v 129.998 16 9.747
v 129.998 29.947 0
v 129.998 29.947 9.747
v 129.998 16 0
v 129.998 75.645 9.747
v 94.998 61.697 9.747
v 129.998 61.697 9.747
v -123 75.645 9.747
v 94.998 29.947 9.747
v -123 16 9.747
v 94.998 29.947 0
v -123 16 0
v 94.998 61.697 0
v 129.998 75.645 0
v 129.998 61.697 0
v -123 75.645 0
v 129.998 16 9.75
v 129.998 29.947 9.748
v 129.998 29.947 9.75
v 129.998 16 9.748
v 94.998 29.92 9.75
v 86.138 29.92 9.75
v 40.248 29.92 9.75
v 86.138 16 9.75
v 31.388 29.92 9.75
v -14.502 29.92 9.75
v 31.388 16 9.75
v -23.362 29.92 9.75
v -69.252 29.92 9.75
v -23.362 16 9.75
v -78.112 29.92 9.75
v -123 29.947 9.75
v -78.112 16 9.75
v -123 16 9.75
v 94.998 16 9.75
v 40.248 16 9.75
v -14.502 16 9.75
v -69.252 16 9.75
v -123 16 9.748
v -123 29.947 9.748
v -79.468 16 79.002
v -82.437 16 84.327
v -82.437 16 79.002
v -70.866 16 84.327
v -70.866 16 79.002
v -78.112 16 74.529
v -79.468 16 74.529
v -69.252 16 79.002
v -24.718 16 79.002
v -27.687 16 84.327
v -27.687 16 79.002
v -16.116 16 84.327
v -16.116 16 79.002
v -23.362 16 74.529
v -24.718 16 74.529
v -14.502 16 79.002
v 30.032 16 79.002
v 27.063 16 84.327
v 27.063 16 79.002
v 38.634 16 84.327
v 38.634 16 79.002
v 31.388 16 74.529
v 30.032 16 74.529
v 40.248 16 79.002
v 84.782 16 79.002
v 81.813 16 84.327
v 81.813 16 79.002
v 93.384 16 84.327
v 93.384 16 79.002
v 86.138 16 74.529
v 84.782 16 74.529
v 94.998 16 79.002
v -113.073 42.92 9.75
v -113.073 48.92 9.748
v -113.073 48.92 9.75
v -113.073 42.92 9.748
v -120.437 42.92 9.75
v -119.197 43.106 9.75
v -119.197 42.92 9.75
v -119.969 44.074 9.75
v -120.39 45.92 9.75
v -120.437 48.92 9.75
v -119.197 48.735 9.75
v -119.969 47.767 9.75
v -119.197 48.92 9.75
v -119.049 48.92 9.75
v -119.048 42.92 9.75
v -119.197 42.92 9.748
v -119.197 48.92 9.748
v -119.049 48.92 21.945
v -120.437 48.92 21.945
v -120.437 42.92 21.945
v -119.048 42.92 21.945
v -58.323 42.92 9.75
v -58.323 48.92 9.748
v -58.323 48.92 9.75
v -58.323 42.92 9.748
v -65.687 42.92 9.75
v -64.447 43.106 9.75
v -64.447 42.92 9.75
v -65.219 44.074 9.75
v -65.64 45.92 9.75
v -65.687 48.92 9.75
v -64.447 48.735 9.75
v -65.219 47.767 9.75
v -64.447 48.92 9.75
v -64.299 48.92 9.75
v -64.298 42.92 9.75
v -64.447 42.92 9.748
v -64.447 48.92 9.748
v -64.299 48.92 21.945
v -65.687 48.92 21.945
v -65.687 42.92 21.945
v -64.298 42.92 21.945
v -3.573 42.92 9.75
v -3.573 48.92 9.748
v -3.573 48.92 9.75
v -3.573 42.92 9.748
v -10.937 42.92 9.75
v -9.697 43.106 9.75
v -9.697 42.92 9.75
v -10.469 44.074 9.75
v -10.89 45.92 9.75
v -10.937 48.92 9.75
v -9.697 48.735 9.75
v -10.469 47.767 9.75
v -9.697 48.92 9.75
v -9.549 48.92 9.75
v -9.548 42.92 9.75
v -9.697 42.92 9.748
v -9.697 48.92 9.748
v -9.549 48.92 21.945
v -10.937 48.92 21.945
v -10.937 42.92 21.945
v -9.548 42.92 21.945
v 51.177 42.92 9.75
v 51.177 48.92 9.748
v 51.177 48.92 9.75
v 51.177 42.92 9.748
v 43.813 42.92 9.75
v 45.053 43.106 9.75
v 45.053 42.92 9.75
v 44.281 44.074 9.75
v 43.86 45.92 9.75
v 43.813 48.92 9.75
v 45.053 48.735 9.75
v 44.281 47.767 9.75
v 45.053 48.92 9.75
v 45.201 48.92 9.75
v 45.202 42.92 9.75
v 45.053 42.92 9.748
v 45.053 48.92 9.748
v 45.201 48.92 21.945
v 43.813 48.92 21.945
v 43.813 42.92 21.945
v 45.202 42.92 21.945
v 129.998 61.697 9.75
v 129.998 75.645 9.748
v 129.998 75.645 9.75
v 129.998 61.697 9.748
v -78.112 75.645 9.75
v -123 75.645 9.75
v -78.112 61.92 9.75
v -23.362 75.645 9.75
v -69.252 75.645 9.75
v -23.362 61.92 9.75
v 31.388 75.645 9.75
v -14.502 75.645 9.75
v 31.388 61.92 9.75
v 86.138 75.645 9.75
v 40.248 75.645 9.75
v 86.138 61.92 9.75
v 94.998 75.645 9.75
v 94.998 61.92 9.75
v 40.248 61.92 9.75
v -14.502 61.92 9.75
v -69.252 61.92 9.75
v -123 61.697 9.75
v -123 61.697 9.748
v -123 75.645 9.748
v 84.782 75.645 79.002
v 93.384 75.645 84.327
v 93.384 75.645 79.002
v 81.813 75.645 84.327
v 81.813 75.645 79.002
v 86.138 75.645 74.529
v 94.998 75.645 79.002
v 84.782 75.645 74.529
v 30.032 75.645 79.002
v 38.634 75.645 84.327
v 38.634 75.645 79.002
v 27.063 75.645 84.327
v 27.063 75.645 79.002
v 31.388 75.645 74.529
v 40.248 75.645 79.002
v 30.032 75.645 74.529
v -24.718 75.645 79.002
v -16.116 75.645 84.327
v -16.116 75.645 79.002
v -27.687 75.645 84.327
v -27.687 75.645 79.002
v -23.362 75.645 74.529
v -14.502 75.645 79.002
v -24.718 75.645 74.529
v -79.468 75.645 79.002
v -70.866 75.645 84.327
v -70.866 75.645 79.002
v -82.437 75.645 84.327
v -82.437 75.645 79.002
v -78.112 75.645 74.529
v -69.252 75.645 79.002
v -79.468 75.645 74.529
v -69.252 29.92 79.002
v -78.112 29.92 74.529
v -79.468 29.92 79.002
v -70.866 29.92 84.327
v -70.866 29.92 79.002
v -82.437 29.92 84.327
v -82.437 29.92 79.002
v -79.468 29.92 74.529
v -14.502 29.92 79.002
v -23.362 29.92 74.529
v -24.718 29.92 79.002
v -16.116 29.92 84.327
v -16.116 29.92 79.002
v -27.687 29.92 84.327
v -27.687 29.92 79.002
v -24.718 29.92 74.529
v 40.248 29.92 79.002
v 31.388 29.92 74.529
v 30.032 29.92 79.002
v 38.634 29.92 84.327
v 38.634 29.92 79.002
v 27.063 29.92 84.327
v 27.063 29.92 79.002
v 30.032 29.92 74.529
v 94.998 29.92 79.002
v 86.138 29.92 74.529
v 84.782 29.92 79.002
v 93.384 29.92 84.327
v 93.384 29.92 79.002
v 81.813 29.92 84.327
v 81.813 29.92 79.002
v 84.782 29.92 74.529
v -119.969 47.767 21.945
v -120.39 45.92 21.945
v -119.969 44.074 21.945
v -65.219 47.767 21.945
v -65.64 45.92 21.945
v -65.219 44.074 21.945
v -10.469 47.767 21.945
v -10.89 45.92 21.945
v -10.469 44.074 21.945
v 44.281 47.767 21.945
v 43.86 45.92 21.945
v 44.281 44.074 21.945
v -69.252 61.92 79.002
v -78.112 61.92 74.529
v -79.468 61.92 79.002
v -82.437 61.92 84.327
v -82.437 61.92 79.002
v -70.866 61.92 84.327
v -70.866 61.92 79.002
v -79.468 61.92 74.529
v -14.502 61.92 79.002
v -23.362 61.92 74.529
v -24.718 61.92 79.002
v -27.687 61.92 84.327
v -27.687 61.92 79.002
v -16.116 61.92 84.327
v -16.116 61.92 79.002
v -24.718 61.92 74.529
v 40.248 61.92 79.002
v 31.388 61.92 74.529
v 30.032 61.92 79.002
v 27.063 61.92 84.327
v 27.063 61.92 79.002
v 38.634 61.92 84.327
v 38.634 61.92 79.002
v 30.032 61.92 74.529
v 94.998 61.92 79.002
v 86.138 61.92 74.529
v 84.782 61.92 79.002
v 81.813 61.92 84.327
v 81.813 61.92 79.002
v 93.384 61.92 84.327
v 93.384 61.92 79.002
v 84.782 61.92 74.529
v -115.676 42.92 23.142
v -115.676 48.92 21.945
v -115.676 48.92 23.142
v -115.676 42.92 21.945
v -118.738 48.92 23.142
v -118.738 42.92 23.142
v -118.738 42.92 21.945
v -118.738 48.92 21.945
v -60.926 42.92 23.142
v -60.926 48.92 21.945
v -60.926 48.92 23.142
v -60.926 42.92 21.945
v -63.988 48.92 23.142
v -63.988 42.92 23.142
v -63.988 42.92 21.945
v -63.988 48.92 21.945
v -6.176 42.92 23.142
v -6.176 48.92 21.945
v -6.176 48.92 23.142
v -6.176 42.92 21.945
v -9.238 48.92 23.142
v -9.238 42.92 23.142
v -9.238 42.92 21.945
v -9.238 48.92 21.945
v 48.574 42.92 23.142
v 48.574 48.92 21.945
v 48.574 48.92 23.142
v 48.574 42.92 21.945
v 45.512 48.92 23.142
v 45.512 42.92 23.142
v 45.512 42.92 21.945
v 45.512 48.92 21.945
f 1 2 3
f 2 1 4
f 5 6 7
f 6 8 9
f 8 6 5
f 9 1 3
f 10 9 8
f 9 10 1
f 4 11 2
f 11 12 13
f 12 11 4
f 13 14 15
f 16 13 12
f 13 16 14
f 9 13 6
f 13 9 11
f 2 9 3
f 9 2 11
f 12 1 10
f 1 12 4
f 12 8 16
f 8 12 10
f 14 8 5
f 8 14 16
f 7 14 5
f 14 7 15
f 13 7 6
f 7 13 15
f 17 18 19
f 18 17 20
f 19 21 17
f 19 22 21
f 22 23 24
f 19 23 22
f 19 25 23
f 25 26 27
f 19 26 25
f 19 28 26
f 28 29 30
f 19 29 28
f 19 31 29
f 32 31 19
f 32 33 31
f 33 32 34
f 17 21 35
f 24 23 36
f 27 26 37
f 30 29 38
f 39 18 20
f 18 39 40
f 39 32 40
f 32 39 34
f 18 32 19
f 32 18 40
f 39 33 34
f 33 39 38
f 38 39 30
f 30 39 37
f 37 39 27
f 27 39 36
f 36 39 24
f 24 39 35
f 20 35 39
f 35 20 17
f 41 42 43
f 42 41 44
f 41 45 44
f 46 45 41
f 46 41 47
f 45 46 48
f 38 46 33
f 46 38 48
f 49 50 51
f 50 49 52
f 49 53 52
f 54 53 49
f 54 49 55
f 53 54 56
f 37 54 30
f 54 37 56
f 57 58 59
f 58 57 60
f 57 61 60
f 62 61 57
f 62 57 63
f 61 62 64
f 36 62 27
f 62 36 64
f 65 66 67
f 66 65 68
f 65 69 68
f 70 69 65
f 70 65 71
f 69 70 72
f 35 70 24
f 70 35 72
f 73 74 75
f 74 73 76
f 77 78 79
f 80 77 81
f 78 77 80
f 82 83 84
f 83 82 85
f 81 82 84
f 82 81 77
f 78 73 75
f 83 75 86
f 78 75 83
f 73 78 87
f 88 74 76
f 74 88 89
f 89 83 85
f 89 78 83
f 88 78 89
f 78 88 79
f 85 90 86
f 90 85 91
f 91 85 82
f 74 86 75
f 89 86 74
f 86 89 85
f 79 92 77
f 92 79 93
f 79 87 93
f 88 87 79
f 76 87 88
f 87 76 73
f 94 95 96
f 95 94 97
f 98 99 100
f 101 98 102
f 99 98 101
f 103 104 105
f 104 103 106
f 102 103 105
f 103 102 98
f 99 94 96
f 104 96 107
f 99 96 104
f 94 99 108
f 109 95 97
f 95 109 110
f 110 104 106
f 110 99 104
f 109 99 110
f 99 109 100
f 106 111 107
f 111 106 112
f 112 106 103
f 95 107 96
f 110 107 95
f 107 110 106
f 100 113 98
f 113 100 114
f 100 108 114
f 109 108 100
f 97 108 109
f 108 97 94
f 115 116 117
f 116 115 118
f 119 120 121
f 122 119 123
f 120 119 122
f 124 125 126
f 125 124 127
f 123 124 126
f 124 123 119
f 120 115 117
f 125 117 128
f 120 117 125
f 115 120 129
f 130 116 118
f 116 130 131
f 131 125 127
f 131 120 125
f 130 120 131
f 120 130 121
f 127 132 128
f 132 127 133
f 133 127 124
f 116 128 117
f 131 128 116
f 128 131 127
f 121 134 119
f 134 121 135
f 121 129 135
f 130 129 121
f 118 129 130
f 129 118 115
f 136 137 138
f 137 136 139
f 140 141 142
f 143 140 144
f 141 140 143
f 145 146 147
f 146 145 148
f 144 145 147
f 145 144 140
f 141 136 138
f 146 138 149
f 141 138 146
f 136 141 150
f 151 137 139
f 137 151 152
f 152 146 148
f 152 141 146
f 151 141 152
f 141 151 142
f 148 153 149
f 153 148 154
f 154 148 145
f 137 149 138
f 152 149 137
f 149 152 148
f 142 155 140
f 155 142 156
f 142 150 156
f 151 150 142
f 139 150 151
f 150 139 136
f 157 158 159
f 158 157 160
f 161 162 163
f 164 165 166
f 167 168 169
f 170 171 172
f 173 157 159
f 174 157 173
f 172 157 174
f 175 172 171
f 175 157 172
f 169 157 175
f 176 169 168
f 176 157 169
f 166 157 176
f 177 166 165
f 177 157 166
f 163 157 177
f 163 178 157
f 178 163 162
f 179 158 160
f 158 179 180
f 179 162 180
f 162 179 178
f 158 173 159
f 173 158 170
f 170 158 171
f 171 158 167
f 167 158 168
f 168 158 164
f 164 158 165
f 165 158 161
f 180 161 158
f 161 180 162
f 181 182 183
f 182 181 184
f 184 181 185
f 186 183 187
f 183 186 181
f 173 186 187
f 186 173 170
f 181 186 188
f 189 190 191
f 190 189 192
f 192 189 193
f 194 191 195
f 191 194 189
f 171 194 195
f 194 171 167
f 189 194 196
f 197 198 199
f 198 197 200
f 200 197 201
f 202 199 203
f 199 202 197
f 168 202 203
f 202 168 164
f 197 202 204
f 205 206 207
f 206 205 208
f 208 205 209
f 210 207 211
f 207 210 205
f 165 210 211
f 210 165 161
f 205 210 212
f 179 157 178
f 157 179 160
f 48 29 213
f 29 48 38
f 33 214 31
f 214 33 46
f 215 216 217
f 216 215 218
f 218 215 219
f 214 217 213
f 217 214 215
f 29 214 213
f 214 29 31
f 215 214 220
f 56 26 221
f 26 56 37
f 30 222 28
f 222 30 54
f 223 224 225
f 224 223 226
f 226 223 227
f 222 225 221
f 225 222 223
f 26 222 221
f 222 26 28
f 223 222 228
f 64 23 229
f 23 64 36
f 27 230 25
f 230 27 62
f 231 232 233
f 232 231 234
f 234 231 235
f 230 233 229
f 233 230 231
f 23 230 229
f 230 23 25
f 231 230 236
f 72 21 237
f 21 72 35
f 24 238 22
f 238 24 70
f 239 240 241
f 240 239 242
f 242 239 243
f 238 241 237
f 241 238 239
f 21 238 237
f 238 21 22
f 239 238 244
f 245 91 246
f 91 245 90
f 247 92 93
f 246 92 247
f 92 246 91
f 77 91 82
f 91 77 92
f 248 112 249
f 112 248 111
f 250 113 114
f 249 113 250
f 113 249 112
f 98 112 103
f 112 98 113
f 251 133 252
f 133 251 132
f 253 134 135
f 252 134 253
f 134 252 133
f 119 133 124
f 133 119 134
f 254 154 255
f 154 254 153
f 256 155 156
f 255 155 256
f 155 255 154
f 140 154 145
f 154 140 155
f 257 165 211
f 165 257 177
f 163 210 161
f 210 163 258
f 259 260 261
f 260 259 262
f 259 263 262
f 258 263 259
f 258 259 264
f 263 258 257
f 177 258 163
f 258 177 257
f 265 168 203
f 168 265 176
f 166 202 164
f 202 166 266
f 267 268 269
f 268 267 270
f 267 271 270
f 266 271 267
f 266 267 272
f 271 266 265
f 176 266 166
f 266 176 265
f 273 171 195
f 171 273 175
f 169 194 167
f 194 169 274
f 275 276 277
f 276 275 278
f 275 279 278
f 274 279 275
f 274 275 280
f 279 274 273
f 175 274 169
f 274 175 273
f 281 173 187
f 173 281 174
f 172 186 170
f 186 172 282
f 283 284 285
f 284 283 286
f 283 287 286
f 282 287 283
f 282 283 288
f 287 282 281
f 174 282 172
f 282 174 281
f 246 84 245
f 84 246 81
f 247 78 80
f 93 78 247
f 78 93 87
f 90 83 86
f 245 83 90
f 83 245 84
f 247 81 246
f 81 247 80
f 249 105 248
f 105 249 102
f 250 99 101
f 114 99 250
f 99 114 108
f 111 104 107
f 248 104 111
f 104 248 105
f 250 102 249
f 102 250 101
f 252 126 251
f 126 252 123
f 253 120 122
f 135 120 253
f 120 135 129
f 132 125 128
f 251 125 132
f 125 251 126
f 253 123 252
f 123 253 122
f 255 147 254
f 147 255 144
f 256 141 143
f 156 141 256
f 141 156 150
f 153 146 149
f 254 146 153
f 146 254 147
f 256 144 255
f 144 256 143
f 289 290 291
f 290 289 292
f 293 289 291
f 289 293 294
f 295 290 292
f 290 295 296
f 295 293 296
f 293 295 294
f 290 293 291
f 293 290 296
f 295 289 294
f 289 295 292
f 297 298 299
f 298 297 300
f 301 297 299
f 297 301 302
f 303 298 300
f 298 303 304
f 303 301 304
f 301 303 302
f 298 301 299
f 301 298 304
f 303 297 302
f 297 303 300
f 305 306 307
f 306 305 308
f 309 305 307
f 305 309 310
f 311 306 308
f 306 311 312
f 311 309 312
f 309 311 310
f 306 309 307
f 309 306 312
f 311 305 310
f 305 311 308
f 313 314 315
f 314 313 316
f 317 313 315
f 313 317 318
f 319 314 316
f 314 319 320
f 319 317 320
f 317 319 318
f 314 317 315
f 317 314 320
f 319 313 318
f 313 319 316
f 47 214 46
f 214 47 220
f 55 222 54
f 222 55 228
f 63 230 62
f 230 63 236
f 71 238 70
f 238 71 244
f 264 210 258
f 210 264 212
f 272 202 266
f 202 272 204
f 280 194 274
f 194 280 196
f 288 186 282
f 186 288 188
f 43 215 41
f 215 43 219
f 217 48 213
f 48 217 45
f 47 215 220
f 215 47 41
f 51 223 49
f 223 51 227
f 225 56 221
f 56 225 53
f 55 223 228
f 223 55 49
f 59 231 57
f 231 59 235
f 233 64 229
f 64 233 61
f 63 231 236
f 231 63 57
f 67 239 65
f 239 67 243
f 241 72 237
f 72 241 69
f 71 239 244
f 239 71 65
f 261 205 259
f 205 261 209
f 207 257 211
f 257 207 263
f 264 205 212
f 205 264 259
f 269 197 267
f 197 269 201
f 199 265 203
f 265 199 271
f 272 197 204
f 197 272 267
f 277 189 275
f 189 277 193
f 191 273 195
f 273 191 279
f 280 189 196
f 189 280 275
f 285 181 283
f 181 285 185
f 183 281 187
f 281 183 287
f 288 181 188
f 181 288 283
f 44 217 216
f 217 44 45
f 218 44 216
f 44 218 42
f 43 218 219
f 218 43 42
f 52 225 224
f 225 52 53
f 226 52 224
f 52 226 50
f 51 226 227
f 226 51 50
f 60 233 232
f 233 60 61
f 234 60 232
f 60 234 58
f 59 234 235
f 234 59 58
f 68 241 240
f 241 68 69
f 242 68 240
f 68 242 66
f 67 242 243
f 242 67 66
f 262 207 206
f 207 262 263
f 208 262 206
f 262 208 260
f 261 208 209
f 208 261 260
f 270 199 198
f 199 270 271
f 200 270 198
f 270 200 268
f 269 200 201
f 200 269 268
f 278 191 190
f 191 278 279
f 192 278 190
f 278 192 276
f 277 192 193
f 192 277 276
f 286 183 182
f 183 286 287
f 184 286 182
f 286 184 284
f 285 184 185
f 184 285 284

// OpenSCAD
// Rewritten from layered polygon rebuild into rectilinear cubes
// Each slab is decomposed into axis-aligned rectangles and emitted as cubes.
// Note: This preserves orthogonal geometry; curved/diagonal features (if any) are approximated.

module rect_prism(x1,y1,x2,y2,z0,h){
  translate([x1,y1,z0]) cube([x2-x1, y2-y1, h], center=false);
}

module slab_1() {
  union() {
    rect_prism(94.997986,15.999999,129.997986,29.946999,0,9.747);
    rect_prism(-123.000008,15.999999,94.997986,75.644997,0,9.747);
    rect_prism(94.997986,61.696999,129.997986,75.644997,0,9.747);
  }
}

module slab_2() {
  union() {
    rect_prism(-123.000008,15.999999,129.997986,29.946999,9.748,0.002);
    rect_prism(-119.196615,42.919998,-113.073431,48.919998,9.748,0.002);
    rect_prism(-64.44663,42.919998,-58.323427,48.919998,9.748,0.002);
    rect_prism(-9.696628,42.919998,-3.573428,48.919998,9.748,0.002);
    rect_prism(45.053381,42.919998,51.176573,48.919998,9.748,0.002);
    rect_prism(-123.000008,61.696999,129.997986,75.644997,9.748,0.002);
  }
}


module slab_3_holes(r=4.255){
  // Detected near-circular through-holes (auto-fit from STL cross-sections)
  for (p = [
    [-116.135160, 45.920380],
    [-61.385160, 45.920380],
    [-6.635160, 45.920380],
    [48.114840, 45.920380],
  ]) translate([p[0], p[1], 9.750]) cylinder(h=12.195, r=r, center=false);
}

module slab_3() {
  difference() {
    union() {
rect_prism(-78.112015,15.999999,-69.252014,29.919998,9.75,12.195);
    rect_prism(-23.362015,15.999999,-14.502014,29.919998,9.75,12.195);
    rect_prism(31.387985,15.999999,40.247986,29.919998,9.75,12.195);
    rect_prism(86.137985,15.999999,94.997986,29.919998,9.75,12.195);
    rect_prism(-120.43741,42.919998,-114.314075,48.919998,9.75,12.195);
    rect_prism(-65.687418,42.919998,-59.564071,48.919998,9.75,12.195);
    rect_prism(-10.937418,42.919998,-4.814072,48.919998,9.75,12.195);
    rect_prism(43.812582,42.919998,49.935932,48.919998,9.75,12.195);
    rect_prism(-78.112015,61.919998,-69.252014,75.644997,9.75,12.195);
    rect_prism(-23.362015,61.919998,-14.502014,75.644997,9.75,12.195);
    rect_prism(31.387985,61.919998,40.247986,75.644997,9.75,12.195);
    rect_prism(86.137985,61.919998,94.997986,75.644997,9.75,12.195);
    }
    slab_3_holes();
  }
}

module slab_4() {
  union() {
    rect_prism(-78.112015,15.999999,-69.252014,29.919998,21.945,1.197);
    rect_prism(-23.362015,15.999999,-14.502014,29.919998,21.945,1.197);
    rect_prism(31.387985,15.999999,40.247986,29.919998,21.945,1.197);
    rect_prism(86.137985,15.999999,94.997986,29.919998,21.945,1.197);
    rect_prism(-118.738005,42.919998,-115.676272,48.919998,21.945,1.197);
    rect_prism(-63.988003,42.919998,-60.926268,48.919998,21.945,1.197);
    rect_prism(-9.238005,42.919998,-6.176269,48.919998,21.945,1.197);
    rect_prism(45.511995,42.919998,48.573739,48.919998,21.945,1.197);
    rect_prism(-78.112015,61.919998,-69.252014,75.644997,21.945,1.197);
    rect_prism(-23.362015,61.919998,-14.502014,75.644997,21.945,1.197);
    rect_prism(31.387985,61.919998,40.247986,75.644997,21.945,1.197);
    rect_prism(86.137985,61.919998,94.997986,75.644997,21.945,1.197);
  }
}

module slab_5() {
  union() {
    rect_prism(-78.112015,15.999999,-69.252014,29.919998,23.142,51.387);
    rect_prism(-23.362015,15.999999,-14.502014,29.919998,23.142,51.387);
    rect_prism(31.387985,15.999999,40.247986,29.919998,23.142,51.387);
    rect_prism(86.137985,15.999999,94.997986,29.919998,23.142,51.387);
    rect_prism(-78.112015,61.919998,-69.252014,75.644997,23.142,51.387);
    rect_prism(-23.362015,61.919998,-14.502014,75.644997,23.142,51.387);
    rect_prism(31.387985,61.919998,40.247986,75.644997,23.142,51.387);
    rect_prism(86.137985,61.919998,94.997986,75.644997,23.142,51.387);
  }
}

module slab_6() {
  union() {
    rect_prism(-79.467536,15.999999,-69.252014,29.919998,74.529,4.4726);
    rect_prism(-24.717536,15.999999,-14.502014,29.919998,74.529,4.4726);
    rect_prism(30.032464,15.999999,40.247986,29.919998,74.529,4.4726);
    rect_prism(84.782464,15.999999,94.997986,29.919998,74.529,4.4726);
    rect_prism(-79.467536,61.919998,-69.252014,75.644997,74.529,4.4726);
    rect_prism(-24.717536,61.919998,-14.502014,75.644997,74.529,4.4726);
    rect_prism(30.032464,61.919998,40.247986,75.644997,74.529,4.4726);
    rect_prism(84.782464,61.919998,94.997986,75.644997,74.529,4.4726);
  }
}

module slab_7() {
  union() {
    rect_prism(-82.437039,15.999999,-70.865755,29.919998,79.0016,5.3254);
    rect_prism(-27.687036,15.999999,-16.115755,29.919998,79.0016,5.3254);
    rect_prism(27.062964,15.999999,38.634246,29.919998,79.0016,5.3254);
    rect_prism(81.812961,15.999999,93.384242,29.919998,79.0016,5.3254);
    rect_prism(-82.437039,61.919998,-70.865755,75.644997,79.0016,5.3254);
    rect_prism(-27.687036,61.919998,-16.115755,75.644997,79.0016,5.3254);
    rect_prism(27.062964,61.919998,38.634246,75.644997,79.0016,5.3254);
    rect_prism(81.812961,61.919998,93.384242,75.644997,79.0016,5.3254);
  }
}

module top() {
  union() {
    slab_1();
    slab_2();
    slab_3();
    slab_4();
    slab_5();
    slab_6();
    slab_7();
  }
}

top();
